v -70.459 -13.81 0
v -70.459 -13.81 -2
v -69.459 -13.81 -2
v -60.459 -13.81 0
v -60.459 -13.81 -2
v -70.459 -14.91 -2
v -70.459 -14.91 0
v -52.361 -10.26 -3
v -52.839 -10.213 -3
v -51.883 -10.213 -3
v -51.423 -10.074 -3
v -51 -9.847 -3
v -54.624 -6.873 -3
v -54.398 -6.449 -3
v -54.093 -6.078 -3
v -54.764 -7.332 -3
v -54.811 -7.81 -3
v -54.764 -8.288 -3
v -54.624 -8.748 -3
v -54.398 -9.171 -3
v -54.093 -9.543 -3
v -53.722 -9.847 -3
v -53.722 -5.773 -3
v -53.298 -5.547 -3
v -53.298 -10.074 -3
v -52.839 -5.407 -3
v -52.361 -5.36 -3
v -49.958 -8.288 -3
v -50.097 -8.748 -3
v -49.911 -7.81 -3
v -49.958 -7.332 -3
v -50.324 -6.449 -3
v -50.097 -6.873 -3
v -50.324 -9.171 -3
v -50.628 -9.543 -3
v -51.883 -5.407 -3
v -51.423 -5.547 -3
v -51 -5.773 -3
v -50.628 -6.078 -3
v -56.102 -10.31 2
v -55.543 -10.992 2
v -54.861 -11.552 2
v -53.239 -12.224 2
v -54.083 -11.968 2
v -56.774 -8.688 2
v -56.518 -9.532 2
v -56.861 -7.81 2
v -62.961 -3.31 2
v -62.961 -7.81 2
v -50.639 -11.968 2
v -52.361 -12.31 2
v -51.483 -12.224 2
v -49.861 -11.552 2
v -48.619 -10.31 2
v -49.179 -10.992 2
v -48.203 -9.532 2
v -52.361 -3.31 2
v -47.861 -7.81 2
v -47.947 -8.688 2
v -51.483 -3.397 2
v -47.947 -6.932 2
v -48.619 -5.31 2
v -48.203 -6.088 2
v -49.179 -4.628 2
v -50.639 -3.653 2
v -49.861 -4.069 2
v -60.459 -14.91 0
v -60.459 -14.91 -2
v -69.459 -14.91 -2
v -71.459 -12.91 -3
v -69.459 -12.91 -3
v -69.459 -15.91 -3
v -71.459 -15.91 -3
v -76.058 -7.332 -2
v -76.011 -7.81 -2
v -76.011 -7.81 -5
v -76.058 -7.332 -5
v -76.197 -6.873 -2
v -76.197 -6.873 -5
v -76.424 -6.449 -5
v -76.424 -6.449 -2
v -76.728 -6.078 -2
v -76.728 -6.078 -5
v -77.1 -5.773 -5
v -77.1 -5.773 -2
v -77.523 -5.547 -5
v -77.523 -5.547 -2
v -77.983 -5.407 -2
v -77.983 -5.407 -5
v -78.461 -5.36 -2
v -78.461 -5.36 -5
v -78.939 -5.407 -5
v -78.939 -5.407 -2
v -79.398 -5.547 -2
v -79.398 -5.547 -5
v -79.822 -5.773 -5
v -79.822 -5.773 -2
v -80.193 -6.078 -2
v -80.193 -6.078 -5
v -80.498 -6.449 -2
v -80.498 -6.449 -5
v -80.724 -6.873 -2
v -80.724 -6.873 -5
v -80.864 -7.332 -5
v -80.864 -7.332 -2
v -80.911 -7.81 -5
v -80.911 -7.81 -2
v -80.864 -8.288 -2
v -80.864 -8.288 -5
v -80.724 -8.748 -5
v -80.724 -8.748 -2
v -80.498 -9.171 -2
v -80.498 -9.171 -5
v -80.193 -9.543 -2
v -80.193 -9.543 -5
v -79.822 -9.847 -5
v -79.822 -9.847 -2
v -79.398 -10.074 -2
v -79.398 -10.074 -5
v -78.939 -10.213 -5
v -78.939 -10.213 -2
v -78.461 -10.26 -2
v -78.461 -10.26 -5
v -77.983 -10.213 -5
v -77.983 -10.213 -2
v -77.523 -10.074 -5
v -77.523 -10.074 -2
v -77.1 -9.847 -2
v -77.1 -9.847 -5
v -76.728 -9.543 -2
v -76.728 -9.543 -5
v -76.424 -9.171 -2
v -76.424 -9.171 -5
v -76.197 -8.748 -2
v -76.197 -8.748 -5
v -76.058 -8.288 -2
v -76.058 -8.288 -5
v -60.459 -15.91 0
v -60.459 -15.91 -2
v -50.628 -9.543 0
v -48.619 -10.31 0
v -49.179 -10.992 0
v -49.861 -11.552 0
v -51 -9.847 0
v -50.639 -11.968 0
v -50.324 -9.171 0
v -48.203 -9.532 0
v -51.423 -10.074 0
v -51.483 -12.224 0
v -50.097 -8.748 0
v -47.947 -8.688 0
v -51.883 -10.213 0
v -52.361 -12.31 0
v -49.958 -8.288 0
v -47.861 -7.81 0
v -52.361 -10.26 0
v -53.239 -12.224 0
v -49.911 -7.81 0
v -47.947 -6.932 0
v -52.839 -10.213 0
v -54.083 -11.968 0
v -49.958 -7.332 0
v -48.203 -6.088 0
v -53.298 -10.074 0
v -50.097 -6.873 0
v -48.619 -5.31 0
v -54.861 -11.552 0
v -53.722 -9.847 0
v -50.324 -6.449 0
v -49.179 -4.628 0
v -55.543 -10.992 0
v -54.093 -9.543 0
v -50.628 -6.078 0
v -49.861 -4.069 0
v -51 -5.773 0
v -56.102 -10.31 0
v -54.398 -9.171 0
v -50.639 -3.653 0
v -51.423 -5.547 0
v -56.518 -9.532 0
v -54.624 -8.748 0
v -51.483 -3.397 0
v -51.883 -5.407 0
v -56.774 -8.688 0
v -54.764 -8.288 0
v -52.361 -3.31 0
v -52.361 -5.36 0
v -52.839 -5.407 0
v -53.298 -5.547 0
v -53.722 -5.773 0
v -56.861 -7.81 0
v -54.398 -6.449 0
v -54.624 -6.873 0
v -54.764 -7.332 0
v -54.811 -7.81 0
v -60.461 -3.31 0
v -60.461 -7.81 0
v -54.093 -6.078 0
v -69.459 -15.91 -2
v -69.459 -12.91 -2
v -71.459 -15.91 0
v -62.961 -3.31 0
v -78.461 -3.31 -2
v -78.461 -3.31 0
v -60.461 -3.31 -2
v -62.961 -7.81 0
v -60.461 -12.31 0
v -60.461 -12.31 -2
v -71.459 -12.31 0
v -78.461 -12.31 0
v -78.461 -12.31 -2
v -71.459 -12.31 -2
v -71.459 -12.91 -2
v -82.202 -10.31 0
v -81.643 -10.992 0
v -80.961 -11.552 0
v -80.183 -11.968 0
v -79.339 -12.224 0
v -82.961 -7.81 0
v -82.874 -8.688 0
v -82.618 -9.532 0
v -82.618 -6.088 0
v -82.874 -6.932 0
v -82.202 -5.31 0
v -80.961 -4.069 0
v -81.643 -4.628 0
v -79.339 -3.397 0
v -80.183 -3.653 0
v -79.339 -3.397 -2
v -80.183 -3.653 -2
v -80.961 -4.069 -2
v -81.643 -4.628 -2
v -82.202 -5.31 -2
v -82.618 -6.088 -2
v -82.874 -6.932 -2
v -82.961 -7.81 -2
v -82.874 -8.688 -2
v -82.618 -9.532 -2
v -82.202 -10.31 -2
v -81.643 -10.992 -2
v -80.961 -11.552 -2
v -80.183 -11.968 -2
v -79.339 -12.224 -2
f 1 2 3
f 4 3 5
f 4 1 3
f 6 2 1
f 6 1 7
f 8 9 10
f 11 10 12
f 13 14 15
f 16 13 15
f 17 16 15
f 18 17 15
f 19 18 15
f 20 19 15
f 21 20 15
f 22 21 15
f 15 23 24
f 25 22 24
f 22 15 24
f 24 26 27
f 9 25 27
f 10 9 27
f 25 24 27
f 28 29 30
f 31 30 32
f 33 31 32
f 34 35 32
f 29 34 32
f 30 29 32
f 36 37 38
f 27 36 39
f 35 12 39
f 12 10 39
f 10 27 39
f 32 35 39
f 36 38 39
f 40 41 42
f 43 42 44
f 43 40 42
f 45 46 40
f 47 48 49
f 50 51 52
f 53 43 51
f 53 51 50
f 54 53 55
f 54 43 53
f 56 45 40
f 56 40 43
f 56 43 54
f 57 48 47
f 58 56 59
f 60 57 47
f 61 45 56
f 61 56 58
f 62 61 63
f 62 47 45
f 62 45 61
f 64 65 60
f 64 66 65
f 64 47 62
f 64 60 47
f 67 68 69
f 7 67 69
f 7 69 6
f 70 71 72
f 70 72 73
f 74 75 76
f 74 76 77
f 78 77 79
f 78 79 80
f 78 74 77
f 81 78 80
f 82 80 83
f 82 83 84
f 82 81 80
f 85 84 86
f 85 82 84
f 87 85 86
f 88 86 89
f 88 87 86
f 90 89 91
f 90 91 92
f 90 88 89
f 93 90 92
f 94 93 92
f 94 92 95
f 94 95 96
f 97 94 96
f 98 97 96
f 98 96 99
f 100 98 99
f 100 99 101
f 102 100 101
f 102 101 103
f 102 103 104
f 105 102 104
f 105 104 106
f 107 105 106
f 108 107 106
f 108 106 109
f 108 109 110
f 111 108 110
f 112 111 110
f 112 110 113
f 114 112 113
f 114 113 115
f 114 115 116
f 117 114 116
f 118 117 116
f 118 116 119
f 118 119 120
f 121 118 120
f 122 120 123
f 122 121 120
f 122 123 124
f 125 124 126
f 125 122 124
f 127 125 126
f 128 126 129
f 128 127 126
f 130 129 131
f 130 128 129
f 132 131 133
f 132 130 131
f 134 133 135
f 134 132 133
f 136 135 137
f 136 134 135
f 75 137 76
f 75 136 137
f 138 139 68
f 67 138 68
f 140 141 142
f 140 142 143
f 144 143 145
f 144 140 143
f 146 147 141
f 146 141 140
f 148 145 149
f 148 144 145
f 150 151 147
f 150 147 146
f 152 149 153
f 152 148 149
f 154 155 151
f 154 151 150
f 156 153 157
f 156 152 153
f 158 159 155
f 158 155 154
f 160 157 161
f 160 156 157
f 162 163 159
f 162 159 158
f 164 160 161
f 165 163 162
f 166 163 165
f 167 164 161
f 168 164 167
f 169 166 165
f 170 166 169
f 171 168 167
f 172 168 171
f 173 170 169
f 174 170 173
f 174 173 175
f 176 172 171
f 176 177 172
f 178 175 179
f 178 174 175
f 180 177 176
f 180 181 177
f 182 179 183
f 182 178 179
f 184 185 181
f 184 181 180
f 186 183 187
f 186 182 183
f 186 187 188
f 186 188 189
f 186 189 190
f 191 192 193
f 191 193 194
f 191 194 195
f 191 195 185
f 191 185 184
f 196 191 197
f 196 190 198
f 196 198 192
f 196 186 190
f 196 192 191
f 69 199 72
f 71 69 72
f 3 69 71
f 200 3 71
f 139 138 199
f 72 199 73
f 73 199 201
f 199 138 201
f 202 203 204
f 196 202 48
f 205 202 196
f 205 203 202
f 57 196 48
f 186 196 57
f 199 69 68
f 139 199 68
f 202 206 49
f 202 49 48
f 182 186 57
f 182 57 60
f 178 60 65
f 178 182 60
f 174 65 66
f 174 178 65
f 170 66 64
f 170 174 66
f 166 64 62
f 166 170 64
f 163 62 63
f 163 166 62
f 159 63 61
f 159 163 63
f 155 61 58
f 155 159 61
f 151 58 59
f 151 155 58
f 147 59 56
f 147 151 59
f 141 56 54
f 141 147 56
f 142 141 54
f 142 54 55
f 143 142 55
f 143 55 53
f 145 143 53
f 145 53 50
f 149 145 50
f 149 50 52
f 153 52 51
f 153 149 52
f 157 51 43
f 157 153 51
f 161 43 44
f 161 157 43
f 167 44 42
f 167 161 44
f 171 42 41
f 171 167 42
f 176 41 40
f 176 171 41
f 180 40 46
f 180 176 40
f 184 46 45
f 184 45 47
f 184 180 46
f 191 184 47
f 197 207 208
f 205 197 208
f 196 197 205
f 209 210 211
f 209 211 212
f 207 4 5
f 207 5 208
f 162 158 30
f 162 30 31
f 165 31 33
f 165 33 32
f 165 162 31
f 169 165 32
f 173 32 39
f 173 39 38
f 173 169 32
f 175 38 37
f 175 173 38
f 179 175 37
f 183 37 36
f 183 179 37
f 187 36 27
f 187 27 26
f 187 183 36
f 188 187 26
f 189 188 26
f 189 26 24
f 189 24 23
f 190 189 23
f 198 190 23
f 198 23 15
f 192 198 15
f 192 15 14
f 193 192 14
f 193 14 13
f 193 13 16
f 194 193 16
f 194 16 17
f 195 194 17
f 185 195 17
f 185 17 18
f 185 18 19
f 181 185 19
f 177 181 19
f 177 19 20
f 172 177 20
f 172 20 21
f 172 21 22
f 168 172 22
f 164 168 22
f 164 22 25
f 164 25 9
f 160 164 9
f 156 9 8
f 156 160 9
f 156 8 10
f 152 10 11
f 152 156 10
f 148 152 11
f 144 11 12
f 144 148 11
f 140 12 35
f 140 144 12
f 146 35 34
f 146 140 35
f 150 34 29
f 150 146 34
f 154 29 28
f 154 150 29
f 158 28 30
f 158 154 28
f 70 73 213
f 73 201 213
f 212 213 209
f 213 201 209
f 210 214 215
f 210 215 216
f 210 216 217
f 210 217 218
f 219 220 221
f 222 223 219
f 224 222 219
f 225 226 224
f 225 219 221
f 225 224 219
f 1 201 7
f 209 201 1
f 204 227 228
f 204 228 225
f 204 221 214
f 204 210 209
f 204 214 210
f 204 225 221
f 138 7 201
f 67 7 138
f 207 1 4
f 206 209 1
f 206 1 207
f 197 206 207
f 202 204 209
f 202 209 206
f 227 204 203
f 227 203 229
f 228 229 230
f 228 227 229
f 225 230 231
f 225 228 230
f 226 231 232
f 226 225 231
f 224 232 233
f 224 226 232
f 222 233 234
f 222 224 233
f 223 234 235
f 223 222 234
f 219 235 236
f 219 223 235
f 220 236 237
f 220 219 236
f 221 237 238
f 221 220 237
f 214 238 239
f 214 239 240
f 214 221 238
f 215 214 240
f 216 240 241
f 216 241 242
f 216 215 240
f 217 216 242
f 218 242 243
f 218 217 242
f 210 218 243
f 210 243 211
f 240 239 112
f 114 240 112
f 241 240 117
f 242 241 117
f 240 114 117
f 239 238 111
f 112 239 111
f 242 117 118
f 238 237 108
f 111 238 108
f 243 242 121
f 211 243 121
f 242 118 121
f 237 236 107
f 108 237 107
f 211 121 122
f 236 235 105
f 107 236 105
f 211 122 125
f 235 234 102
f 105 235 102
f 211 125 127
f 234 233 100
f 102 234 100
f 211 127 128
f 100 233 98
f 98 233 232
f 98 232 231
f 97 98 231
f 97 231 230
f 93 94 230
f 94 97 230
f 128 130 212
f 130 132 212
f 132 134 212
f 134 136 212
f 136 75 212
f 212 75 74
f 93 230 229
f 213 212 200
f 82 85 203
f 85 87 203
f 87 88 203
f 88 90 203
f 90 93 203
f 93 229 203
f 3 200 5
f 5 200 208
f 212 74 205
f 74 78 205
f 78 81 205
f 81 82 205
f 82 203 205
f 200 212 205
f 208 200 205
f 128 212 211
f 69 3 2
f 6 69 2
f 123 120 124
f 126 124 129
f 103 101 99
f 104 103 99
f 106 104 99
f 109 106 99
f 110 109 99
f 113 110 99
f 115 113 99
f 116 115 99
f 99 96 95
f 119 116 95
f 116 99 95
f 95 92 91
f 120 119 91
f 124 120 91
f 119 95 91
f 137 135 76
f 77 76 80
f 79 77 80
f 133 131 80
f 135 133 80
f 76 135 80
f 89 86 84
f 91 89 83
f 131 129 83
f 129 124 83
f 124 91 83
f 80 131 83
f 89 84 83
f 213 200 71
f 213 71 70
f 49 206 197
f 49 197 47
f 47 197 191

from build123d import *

# Parameters (mm, degrees)
SKETCH_1_R       = 2.45
EXTRUDE_1_DEPTH  = 2
SKETCH_1_3_R     = 2.45
EXTRUDE_2_DEPTH  = 2
SKETCH_3_W       = 2.5
SKETCH_3_H       = 4.5
EXTRUDE_3_DEPTH  = 2
EXTRUDE_START    = -5
SKETCH_5_R       = 2.45
EXTRUDE_4_DEPTH  = 5
EXTRUDE_8_DEPTH  = 2
SKETCH_13_W      = 2
SKETCH_13_H      = 3
EXTRUDE_12_DEPTH = 1
SKETCH_16_R      = 2.45
EXTRUDE_16_DEPTH = 5


with BuildPart() as part:
    # 草图1 → 凸台-拉伸1 (new body)
    with BuildSketch(Plane.XY):
        with BuildLine():
            Line((-52.360741066, -3.31033927), (-60.460741066, -3.31033927))
            Line((-60.460741066, -3.31033927), (-60.460741066, -7.81033927))
            Line((-60.460741066, -7.81033927), (-56.860741066, -7.81033927))
            ThreePointArc((-56.860741066, -7.81033927), (-49.178760551, -10.992319786), (-52.360741066, -3.31033927))
        make_face()
        with Locations((-52.360741066, -7.81033927)):
            Circle(SKETCH_1_R, mode=Mode.SUBTRACT)
    extrude(amount=EXTRUDE_1_DEPTH)



with BuildPart() as body_2:
    # 草图1<3> → 凸台-拉伸2 (new body)
    with BuildSketch(Plane.XY):
        with BuildLine():
            Line((-72.411189037, -12.31033927), (-70.458584645, -12.31033927))
            Line((-70.458584645, -12.31033927), (-70.458584645, -13.81033927))
            Line((-70.458584645, -13.81033927), (-65.458584645, -13.81033927))
            Line((-65.458584645, -13.81033927), (-60.458584645, -13.81033927))
            Line((-60.458584645, -13.81033927), (-60.460741066, -12.31033927))
            Line((-60.460741066, -12.31033927), (-60.460741066, -7.81033927))
            Line((-60.460741066, -7.81033927), (-60.460741066, -3.31033927))
            Line((-60.460741066, -3.31033927), (-78.460741066, -3.31033927))
            ThreePointArc((-78.460741066, -3.31033927), (-82.960741066, -7.81033927), (-78.460741066, -12.31033927))
            Line((-78.460741066, -12.31033927), (-72.411189037, -12.31033927))
        make_face()
        with Locations((-78.460741066, -7.81033927)):
            Circle(SKETCH_1_3_R, mode=Mode.SUBTRACT)
    extrude(amount=-EXTRUDE_2_DEPTH)


with BuildPart() as part_1:
    add(part.part)

    add(body_2.part)  # 凸台-拉伸3 merges body 2
    # 草图3 → 凸台-拉伸3 (add)
    with BuildSketch(Plane.XY):
        with Locations((-61.710741066, -5.56033927)):
            Rectangle(SKETCH_3_W, SKETCH_3_H)
    extrude(amount=EXTRUDE_3_DEPTH)

    # 草图5 → 凸台-拉伸4 (add)
    with BuildSketch(Plane.XY.offset(2).offset(EXTRUDE_START)):
        with Locations((-52.360741066, -7.81033927)):
            Circle(SKETCH_5_R)
    extrude(amount=EXTRUDE_4_DEPTH)

    # 草图10 → 凸台-拉伸8 (add)
    with BuildSketch(Plane(origin=(0, 0, -2), x_dir=(-1, 0, 0), z_dir=(0, 0, -1))):
        Polygon((70.458584645, -12.31033927), (71.458584645, -12.31033927), (71.458584645, -13.81033927), (71.458584645, -15.91033927), (70.458584645, -15.91033927), (60.458584645, -15.91033927), (60.458584645, -14.91033927), (70.458584645, -14.91033927), (70.458584645, -13.81033927), align=None)
    extrude(amount=-EXTRUDE_8_DEPTH)

    # 草图13 → 凸台-拉伸12 (add)
    with BuildSketch(Plane(origin=(0, 0, -2), x_dir=(-1, 0, 0), z_dir=(0, 0, -1))):
        with Locations((70.458584645, -14.41033927)):
            Rectangle(SKETCH_13_W, SKETCH_13_H)
    extrude(amount=EXTRUDE_12_DEPTH)

    # 草图16 → 凸台-拉伸16 (add)
    with BuildSketch(Plane.XY):
        with Locations((-78.460741066, -7.81033927)):
            Circle(SKETCH_16_R)
    extrude(amount=-EXTRUDE_16_DEPTH)


solid = part_1.part
